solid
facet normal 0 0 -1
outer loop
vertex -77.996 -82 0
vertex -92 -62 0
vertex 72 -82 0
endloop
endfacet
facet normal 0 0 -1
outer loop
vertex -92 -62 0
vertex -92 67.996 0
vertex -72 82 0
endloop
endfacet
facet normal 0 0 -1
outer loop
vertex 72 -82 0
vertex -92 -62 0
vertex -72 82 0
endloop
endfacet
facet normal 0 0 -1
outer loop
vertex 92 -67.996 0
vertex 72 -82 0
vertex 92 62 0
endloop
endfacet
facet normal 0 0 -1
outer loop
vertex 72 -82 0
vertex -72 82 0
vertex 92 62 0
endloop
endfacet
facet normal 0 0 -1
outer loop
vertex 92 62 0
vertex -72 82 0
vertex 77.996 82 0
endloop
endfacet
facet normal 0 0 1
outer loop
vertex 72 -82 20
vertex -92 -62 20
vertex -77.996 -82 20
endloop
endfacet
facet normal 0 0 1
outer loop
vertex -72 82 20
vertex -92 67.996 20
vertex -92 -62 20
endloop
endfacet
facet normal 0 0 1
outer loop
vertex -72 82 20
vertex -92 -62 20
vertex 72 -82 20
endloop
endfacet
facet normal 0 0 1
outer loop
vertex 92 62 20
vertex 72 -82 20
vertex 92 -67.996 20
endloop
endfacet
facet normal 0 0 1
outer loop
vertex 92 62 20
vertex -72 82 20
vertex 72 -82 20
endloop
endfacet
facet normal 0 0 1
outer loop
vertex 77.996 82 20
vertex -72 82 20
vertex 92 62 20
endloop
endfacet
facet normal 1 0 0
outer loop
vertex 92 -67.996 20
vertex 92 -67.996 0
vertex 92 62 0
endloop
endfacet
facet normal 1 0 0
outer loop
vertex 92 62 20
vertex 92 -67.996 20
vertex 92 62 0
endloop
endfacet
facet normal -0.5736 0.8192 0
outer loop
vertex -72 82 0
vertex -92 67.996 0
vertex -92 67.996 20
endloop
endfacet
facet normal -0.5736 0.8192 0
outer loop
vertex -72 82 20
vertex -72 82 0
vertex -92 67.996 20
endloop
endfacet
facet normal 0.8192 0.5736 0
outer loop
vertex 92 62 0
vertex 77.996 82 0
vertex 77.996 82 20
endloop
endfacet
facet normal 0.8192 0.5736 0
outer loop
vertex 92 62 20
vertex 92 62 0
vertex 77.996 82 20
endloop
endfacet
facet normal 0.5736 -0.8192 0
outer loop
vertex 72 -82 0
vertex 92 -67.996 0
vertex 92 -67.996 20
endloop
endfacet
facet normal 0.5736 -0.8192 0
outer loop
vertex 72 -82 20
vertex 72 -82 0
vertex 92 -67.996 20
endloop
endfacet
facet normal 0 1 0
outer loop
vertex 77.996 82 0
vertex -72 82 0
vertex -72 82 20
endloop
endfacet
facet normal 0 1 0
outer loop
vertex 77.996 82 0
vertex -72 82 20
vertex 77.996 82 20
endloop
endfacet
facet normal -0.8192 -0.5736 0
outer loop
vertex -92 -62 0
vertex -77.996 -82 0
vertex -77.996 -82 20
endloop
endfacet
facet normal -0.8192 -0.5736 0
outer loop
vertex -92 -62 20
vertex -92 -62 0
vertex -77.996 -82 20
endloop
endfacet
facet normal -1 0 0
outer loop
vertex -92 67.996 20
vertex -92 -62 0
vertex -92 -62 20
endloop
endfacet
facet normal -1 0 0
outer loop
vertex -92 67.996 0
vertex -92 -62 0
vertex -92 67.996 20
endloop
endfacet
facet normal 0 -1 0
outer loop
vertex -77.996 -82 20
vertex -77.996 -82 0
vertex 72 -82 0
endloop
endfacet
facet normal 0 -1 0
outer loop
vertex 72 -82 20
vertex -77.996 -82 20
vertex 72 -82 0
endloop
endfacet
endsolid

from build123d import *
from OCP.BRepFilletAPI import BRepFilletAPI_MakeChamfer

# Parameters (mm, degrees)
SKETCH_1_W      = 184
SKETCH_1_H      = 164
EXTRUDE_1_DEPTH = 20
CHAMFER_1_SIZE  = 20
CHAMFER_1_SIZE2 = 14.004150764


with BuildPart() as part:
    # 草图1 → 凸台-拉伸1 (new body)
    with BuildSketch(Plane.XY):
        Rectangle(SKETCH_1_W, SKETCH_1_H)
    extrude(amount=EXTRUDE_1_DEPTH)

    # 倒角1: one chamfer whose edges measure the first distance from different faces: ONE call of the kernel's chamfer builder (chamfer() names one face for all edges)
    chamfer_1_edges_1 = [part.edges().sort_by_distance(p)[0] for p in [
        (92, -82, 10),
    ]]
    chamfer_1_side_1 = [part.faces().sort_by_distance(p)[0] for p in [
        (0, -82, 10),
    ]]
    chamfer_1_edges_2 = [part.edges().sort_by_distance(p)[0] for p in [
        (-92, -82, 10),
    ]]
    chamfer_1_side_2 = [part.faces().sort_by_distance(p)[0] for p in [
        (-92, 0, 10),
    ]]
    chamfer_1_edges_3 = [part.edges().sort_by_distance(p)[0] for p in [
        (-92, 82, 10),
    ]]
    chamfer_1_side_3 = [part.faces().sort_by_distance(p)[0] for p in [
        (0, 82, 10),
    ]]
    chamfer_1_edges_4 = [part.edges().sort_by_distance(p)[0] for p in [
        (92, 82, 10),
    ]]
    chamfer_1_side_4 = [part.faces().sort_by_distance(p)[0] for p in [
        (92, 0, 10),
    ]]
    chamfer_1 = BRepFilletAPI_MakeChamfer(part.part.solid().wrapped)
    for e in chamfer_1_edges_1:
        chamfer_1.Add(CHAMFER_1_SIZE, CHAMFER_1_SIZE2, e.wrapped, chamfer_1_side_1[0].wrapped)  # the first distance lies on this face
    for e in chamfer_1_edges_2:
        chamfer_1.Add(CHAMFER_1_SIZE, CHAMFER_1_SIZE2, e.wrapped, chamfer_1_side_2[0].wrapped)  # the first distance lies on this face
    for e in chamfer_1_edges_3:
        chamfer_1.Add(CHAMFER_1_SIZE, CHAMFER_1_SIZE2, e.wrapped, chamfer_1_side_3[0].wrapped)  # the first distance lies on this face
    for e in chamfer_1_edges_4:
        chamfer_1.Add(CHAMFER_1_SIZE, CHAMFER_1_SIZE2, e.wrapped, chamfer_1_side_4[0].wrapped)  # the first distance lies on this face
    add(Compound.cast(chamfer_1.Shape()), mode=Mode.REPLACE)


solid = part.part
